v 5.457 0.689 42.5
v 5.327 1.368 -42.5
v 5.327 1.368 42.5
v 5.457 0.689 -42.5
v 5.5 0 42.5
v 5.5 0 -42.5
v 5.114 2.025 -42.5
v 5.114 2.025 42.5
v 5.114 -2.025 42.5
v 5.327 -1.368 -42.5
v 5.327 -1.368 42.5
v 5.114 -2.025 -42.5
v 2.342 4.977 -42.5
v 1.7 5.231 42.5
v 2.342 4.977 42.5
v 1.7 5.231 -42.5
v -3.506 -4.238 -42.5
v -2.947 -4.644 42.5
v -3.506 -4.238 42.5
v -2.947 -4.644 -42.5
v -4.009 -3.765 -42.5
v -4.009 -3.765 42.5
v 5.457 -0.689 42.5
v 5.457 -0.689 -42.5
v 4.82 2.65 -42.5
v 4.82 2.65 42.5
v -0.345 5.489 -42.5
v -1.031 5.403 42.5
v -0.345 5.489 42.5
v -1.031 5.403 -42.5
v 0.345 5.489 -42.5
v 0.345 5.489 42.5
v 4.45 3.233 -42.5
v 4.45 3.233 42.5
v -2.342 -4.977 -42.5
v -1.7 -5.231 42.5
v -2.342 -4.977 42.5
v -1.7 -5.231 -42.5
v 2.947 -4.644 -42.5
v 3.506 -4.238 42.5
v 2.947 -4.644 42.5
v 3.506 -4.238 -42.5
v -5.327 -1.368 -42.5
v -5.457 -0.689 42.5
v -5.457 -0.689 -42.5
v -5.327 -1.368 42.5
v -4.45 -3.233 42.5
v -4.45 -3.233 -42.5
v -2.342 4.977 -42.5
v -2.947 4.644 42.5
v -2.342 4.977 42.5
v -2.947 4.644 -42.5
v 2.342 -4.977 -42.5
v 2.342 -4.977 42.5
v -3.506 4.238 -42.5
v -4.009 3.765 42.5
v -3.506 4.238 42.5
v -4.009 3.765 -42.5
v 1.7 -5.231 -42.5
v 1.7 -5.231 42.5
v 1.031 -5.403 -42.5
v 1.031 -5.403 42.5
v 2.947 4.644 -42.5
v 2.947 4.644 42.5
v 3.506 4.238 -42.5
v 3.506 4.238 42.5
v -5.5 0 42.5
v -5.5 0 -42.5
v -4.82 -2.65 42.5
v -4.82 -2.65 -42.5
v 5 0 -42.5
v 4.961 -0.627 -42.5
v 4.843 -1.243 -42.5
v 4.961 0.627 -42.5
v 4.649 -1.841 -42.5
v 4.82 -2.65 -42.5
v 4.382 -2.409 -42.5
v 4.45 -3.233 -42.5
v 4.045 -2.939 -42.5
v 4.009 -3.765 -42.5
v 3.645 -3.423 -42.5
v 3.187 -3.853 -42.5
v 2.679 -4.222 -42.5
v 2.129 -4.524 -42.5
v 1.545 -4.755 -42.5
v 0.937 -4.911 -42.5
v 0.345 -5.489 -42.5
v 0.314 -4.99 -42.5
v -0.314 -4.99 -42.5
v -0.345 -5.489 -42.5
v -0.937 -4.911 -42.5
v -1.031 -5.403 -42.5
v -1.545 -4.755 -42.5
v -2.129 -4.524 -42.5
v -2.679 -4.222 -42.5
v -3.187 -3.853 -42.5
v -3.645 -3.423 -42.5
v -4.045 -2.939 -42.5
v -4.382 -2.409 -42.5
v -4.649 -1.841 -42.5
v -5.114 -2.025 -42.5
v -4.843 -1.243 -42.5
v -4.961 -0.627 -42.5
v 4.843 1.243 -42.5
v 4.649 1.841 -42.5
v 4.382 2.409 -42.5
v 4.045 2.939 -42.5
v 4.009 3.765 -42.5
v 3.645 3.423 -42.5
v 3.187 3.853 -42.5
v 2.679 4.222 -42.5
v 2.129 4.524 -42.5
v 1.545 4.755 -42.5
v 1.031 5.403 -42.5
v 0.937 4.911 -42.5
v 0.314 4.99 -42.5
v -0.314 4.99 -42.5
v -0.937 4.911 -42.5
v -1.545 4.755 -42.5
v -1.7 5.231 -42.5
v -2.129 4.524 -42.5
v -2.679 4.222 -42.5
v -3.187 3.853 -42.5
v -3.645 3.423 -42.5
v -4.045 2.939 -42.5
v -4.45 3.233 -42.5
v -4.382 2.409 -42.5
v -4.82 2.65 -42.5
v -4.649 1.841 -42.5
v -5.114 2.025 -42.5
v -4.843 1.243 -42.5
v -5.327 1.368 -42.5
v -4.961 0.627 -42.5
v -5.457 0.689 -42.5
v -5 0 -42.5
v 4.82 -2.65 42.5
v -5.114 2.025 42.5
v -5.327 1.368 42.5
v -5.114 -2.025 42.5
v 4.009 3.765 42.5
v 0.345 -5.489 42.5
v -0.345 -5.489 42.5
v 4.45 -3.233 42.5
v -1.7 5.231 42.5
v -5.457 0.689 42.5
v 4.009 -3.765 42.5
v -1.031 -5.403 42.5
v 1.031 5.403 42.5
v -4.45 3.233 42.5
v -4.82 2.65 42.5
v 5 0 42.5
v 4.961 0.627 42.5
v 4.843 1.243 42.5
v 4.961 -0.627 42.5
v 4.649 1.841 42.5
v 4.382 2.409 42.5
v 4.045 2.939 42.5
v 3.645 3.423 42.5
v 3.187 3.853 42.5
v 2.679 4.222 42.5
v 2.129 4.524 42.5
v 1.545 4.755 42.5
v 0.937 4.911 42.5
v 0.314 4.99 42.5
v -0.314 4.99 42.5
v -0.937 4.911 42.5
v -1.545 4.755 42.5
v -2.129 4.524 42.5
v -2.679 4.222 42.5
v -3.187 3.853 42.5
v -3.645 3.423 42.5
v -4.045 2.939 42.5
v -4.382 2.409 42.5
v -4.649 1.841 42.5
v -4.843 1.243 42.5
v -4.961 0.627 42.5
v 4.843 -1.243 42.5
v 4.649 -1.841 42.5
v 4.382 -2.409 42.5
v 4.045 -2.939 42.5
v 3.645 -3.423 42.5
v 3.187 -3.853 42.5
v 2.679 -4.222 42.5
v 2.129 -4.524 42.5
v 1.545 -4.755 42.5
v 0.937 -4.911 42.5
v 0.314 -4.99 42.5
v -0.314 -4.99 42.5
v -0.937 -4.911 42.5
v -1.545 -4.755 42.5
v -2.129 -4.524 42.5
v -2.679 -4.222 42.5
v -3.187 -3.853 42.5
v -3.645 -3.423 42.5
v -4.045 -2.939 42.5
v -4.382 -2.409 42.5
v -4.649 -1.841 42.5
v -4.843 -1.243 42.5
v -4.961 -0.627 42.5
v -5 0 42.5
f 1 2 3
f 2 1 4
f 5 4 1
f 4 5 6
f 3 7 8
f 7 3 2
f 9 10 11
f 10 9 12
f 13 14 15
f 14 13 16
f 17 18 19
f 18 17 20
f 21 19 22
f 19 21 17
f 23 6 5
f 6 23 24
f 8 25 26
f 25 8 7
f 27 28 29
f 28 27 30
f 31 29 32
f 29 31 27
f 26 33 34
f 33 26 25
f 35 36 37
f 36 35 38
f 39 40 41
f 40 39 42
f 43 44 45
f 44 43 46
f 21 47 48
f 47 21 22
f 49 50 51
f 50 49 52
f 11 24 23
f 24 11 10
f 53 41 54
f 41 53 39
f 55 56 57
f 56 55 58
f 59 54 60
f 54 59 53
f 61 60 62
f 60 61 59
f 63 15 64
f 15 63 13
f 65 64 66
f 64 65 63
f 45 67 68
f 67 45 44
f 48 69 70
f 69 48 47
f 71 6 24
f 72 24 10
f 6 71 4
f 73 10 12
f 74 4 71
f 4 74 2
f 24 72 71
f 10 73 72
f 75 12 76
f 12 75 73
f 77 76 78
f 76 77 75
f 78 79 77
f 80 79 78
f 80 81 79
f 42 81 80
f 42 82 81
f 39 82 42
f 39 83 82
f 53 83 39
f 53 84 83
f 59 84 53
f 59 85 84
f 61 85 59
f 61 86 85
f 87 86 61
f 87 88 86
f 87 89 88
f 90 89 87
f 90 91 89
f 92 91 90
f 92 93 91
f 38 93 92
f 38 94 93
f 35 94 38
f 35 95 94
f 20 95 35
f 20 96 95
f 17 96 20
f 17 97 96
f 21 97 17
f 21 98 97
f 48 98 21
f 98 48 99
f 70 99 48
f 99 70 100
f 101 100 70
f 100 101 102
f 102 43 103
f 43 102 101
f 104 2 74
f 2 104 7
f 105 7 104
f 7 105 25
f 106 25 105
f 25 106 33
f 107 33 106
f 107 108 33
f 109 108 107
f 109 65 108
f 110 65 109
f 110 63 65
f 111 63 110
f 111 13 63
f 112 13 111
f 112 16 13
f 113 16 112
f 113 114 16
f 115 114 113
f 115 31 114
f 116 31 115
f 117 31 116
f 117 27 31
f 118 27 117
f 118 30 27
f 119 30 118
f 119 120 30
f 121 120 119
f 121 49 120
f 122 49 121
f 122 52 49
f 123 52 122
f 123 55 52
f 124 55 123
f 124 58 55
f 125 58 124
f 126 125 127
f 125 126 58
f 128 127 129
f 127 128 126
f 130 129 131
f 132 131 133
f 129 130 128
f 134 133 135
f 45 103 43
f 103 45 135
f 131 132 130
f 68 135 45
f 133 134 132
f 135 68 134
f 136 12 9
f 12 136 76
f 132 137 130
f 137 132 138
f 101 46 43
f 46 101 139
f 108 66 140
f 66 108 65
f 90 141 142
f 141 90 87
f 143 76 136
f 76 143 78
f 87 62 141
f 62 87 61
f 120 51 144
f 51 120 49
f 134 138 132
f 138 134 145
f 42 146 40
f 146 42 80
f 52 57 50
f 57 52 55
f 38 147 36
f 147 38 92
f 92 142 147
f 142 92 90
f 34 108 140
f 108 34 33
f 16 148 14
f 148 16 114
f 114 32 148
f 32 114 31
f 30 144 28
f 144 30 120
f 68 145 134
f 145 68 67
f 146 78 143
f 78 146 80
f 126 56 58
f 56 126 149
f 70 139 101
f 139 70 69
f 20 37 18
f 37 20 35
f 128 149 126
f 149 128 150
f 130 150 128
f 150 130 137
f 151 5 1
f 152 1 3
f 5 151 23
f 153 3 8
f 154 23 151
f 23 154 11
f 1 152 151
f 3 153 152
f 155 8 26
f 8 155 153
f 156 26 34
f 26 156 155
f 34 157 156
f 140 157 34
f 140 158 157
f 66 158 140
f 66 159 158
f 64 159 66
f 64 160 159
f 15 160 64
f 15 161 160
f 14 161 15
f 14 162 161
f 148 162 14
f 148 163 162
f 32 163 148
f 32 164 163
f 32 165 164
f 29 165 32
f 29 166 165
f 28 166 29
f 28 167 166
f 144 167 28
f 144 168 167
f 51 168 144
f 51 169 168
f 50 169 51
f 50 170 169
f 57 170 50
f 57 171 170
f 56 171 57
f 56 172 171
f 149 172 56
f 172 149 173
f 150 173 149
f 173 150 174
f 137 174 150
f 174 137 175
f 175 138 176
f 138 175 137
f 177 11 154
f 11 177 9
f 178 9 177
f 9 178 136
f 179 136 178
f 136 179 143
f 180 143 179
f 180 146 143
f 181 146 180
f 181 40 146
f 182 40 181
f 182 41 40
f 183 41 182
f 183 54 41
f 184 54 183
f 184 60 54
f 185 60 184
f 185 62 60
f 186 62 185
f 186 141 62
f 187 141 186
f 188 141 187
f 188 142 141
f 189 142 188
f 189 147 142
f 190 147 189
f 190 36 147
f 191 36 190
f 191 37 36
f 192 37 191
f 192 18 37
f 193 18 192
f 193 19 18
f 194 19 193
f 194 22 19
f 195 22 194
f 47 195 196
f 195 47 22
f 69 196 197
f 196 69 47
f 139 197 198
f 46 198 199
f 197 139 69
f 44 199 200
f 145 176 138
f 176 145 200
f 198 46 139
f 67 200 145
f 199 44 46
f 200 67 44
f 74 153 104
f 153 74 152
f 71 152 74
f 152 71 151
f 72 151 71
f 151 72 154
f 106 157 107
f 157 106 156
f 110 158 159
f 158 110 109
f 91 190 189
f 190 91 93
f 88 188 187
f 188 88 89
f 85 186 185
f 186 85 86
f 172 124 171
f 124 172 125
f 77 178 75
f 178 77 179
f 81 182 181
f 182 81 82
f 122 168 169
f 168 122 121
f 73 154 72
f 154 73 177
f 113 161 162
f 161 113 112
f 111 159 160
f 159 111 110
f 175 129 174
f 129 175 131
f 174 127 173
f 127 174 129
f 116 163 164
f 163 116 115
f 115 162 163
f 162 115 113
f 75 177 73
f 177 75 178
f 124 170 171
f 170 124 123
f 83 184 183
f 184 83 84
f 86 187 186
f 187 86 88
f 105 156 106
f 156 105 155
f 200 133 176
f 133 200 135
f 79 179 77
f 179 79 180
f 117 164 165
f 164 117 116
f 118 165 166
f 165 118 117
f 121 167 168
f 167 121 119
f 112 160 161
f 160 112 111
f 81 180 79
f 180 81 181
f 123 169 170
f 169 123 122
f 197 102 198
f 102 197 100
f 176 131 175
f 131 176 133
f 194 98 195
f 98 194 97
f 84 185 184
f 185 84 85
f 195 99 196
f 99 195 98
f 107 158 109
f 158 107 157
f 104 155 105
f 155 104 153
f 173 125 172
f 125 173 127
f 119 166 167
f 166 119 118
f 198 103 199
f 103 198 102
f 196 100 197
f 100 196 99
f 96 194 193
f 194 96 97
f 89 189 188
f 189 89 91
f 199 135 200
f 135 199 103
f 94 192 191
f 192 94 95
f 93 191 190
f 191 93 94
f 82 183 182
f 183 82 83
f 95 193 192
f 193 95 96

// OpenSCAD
$fn = 50;


difference() {
	union() {
		translate(v = [0, 0, -42.5000000000]) {
			cylinder(h = 85, r = 5.5000000000);
		}
	}
	union() {
		translate(v = [0, 0, -100.0000000000]) {
			cylinder(h = 200, r = 5.0000000000);
		}
	}
}
